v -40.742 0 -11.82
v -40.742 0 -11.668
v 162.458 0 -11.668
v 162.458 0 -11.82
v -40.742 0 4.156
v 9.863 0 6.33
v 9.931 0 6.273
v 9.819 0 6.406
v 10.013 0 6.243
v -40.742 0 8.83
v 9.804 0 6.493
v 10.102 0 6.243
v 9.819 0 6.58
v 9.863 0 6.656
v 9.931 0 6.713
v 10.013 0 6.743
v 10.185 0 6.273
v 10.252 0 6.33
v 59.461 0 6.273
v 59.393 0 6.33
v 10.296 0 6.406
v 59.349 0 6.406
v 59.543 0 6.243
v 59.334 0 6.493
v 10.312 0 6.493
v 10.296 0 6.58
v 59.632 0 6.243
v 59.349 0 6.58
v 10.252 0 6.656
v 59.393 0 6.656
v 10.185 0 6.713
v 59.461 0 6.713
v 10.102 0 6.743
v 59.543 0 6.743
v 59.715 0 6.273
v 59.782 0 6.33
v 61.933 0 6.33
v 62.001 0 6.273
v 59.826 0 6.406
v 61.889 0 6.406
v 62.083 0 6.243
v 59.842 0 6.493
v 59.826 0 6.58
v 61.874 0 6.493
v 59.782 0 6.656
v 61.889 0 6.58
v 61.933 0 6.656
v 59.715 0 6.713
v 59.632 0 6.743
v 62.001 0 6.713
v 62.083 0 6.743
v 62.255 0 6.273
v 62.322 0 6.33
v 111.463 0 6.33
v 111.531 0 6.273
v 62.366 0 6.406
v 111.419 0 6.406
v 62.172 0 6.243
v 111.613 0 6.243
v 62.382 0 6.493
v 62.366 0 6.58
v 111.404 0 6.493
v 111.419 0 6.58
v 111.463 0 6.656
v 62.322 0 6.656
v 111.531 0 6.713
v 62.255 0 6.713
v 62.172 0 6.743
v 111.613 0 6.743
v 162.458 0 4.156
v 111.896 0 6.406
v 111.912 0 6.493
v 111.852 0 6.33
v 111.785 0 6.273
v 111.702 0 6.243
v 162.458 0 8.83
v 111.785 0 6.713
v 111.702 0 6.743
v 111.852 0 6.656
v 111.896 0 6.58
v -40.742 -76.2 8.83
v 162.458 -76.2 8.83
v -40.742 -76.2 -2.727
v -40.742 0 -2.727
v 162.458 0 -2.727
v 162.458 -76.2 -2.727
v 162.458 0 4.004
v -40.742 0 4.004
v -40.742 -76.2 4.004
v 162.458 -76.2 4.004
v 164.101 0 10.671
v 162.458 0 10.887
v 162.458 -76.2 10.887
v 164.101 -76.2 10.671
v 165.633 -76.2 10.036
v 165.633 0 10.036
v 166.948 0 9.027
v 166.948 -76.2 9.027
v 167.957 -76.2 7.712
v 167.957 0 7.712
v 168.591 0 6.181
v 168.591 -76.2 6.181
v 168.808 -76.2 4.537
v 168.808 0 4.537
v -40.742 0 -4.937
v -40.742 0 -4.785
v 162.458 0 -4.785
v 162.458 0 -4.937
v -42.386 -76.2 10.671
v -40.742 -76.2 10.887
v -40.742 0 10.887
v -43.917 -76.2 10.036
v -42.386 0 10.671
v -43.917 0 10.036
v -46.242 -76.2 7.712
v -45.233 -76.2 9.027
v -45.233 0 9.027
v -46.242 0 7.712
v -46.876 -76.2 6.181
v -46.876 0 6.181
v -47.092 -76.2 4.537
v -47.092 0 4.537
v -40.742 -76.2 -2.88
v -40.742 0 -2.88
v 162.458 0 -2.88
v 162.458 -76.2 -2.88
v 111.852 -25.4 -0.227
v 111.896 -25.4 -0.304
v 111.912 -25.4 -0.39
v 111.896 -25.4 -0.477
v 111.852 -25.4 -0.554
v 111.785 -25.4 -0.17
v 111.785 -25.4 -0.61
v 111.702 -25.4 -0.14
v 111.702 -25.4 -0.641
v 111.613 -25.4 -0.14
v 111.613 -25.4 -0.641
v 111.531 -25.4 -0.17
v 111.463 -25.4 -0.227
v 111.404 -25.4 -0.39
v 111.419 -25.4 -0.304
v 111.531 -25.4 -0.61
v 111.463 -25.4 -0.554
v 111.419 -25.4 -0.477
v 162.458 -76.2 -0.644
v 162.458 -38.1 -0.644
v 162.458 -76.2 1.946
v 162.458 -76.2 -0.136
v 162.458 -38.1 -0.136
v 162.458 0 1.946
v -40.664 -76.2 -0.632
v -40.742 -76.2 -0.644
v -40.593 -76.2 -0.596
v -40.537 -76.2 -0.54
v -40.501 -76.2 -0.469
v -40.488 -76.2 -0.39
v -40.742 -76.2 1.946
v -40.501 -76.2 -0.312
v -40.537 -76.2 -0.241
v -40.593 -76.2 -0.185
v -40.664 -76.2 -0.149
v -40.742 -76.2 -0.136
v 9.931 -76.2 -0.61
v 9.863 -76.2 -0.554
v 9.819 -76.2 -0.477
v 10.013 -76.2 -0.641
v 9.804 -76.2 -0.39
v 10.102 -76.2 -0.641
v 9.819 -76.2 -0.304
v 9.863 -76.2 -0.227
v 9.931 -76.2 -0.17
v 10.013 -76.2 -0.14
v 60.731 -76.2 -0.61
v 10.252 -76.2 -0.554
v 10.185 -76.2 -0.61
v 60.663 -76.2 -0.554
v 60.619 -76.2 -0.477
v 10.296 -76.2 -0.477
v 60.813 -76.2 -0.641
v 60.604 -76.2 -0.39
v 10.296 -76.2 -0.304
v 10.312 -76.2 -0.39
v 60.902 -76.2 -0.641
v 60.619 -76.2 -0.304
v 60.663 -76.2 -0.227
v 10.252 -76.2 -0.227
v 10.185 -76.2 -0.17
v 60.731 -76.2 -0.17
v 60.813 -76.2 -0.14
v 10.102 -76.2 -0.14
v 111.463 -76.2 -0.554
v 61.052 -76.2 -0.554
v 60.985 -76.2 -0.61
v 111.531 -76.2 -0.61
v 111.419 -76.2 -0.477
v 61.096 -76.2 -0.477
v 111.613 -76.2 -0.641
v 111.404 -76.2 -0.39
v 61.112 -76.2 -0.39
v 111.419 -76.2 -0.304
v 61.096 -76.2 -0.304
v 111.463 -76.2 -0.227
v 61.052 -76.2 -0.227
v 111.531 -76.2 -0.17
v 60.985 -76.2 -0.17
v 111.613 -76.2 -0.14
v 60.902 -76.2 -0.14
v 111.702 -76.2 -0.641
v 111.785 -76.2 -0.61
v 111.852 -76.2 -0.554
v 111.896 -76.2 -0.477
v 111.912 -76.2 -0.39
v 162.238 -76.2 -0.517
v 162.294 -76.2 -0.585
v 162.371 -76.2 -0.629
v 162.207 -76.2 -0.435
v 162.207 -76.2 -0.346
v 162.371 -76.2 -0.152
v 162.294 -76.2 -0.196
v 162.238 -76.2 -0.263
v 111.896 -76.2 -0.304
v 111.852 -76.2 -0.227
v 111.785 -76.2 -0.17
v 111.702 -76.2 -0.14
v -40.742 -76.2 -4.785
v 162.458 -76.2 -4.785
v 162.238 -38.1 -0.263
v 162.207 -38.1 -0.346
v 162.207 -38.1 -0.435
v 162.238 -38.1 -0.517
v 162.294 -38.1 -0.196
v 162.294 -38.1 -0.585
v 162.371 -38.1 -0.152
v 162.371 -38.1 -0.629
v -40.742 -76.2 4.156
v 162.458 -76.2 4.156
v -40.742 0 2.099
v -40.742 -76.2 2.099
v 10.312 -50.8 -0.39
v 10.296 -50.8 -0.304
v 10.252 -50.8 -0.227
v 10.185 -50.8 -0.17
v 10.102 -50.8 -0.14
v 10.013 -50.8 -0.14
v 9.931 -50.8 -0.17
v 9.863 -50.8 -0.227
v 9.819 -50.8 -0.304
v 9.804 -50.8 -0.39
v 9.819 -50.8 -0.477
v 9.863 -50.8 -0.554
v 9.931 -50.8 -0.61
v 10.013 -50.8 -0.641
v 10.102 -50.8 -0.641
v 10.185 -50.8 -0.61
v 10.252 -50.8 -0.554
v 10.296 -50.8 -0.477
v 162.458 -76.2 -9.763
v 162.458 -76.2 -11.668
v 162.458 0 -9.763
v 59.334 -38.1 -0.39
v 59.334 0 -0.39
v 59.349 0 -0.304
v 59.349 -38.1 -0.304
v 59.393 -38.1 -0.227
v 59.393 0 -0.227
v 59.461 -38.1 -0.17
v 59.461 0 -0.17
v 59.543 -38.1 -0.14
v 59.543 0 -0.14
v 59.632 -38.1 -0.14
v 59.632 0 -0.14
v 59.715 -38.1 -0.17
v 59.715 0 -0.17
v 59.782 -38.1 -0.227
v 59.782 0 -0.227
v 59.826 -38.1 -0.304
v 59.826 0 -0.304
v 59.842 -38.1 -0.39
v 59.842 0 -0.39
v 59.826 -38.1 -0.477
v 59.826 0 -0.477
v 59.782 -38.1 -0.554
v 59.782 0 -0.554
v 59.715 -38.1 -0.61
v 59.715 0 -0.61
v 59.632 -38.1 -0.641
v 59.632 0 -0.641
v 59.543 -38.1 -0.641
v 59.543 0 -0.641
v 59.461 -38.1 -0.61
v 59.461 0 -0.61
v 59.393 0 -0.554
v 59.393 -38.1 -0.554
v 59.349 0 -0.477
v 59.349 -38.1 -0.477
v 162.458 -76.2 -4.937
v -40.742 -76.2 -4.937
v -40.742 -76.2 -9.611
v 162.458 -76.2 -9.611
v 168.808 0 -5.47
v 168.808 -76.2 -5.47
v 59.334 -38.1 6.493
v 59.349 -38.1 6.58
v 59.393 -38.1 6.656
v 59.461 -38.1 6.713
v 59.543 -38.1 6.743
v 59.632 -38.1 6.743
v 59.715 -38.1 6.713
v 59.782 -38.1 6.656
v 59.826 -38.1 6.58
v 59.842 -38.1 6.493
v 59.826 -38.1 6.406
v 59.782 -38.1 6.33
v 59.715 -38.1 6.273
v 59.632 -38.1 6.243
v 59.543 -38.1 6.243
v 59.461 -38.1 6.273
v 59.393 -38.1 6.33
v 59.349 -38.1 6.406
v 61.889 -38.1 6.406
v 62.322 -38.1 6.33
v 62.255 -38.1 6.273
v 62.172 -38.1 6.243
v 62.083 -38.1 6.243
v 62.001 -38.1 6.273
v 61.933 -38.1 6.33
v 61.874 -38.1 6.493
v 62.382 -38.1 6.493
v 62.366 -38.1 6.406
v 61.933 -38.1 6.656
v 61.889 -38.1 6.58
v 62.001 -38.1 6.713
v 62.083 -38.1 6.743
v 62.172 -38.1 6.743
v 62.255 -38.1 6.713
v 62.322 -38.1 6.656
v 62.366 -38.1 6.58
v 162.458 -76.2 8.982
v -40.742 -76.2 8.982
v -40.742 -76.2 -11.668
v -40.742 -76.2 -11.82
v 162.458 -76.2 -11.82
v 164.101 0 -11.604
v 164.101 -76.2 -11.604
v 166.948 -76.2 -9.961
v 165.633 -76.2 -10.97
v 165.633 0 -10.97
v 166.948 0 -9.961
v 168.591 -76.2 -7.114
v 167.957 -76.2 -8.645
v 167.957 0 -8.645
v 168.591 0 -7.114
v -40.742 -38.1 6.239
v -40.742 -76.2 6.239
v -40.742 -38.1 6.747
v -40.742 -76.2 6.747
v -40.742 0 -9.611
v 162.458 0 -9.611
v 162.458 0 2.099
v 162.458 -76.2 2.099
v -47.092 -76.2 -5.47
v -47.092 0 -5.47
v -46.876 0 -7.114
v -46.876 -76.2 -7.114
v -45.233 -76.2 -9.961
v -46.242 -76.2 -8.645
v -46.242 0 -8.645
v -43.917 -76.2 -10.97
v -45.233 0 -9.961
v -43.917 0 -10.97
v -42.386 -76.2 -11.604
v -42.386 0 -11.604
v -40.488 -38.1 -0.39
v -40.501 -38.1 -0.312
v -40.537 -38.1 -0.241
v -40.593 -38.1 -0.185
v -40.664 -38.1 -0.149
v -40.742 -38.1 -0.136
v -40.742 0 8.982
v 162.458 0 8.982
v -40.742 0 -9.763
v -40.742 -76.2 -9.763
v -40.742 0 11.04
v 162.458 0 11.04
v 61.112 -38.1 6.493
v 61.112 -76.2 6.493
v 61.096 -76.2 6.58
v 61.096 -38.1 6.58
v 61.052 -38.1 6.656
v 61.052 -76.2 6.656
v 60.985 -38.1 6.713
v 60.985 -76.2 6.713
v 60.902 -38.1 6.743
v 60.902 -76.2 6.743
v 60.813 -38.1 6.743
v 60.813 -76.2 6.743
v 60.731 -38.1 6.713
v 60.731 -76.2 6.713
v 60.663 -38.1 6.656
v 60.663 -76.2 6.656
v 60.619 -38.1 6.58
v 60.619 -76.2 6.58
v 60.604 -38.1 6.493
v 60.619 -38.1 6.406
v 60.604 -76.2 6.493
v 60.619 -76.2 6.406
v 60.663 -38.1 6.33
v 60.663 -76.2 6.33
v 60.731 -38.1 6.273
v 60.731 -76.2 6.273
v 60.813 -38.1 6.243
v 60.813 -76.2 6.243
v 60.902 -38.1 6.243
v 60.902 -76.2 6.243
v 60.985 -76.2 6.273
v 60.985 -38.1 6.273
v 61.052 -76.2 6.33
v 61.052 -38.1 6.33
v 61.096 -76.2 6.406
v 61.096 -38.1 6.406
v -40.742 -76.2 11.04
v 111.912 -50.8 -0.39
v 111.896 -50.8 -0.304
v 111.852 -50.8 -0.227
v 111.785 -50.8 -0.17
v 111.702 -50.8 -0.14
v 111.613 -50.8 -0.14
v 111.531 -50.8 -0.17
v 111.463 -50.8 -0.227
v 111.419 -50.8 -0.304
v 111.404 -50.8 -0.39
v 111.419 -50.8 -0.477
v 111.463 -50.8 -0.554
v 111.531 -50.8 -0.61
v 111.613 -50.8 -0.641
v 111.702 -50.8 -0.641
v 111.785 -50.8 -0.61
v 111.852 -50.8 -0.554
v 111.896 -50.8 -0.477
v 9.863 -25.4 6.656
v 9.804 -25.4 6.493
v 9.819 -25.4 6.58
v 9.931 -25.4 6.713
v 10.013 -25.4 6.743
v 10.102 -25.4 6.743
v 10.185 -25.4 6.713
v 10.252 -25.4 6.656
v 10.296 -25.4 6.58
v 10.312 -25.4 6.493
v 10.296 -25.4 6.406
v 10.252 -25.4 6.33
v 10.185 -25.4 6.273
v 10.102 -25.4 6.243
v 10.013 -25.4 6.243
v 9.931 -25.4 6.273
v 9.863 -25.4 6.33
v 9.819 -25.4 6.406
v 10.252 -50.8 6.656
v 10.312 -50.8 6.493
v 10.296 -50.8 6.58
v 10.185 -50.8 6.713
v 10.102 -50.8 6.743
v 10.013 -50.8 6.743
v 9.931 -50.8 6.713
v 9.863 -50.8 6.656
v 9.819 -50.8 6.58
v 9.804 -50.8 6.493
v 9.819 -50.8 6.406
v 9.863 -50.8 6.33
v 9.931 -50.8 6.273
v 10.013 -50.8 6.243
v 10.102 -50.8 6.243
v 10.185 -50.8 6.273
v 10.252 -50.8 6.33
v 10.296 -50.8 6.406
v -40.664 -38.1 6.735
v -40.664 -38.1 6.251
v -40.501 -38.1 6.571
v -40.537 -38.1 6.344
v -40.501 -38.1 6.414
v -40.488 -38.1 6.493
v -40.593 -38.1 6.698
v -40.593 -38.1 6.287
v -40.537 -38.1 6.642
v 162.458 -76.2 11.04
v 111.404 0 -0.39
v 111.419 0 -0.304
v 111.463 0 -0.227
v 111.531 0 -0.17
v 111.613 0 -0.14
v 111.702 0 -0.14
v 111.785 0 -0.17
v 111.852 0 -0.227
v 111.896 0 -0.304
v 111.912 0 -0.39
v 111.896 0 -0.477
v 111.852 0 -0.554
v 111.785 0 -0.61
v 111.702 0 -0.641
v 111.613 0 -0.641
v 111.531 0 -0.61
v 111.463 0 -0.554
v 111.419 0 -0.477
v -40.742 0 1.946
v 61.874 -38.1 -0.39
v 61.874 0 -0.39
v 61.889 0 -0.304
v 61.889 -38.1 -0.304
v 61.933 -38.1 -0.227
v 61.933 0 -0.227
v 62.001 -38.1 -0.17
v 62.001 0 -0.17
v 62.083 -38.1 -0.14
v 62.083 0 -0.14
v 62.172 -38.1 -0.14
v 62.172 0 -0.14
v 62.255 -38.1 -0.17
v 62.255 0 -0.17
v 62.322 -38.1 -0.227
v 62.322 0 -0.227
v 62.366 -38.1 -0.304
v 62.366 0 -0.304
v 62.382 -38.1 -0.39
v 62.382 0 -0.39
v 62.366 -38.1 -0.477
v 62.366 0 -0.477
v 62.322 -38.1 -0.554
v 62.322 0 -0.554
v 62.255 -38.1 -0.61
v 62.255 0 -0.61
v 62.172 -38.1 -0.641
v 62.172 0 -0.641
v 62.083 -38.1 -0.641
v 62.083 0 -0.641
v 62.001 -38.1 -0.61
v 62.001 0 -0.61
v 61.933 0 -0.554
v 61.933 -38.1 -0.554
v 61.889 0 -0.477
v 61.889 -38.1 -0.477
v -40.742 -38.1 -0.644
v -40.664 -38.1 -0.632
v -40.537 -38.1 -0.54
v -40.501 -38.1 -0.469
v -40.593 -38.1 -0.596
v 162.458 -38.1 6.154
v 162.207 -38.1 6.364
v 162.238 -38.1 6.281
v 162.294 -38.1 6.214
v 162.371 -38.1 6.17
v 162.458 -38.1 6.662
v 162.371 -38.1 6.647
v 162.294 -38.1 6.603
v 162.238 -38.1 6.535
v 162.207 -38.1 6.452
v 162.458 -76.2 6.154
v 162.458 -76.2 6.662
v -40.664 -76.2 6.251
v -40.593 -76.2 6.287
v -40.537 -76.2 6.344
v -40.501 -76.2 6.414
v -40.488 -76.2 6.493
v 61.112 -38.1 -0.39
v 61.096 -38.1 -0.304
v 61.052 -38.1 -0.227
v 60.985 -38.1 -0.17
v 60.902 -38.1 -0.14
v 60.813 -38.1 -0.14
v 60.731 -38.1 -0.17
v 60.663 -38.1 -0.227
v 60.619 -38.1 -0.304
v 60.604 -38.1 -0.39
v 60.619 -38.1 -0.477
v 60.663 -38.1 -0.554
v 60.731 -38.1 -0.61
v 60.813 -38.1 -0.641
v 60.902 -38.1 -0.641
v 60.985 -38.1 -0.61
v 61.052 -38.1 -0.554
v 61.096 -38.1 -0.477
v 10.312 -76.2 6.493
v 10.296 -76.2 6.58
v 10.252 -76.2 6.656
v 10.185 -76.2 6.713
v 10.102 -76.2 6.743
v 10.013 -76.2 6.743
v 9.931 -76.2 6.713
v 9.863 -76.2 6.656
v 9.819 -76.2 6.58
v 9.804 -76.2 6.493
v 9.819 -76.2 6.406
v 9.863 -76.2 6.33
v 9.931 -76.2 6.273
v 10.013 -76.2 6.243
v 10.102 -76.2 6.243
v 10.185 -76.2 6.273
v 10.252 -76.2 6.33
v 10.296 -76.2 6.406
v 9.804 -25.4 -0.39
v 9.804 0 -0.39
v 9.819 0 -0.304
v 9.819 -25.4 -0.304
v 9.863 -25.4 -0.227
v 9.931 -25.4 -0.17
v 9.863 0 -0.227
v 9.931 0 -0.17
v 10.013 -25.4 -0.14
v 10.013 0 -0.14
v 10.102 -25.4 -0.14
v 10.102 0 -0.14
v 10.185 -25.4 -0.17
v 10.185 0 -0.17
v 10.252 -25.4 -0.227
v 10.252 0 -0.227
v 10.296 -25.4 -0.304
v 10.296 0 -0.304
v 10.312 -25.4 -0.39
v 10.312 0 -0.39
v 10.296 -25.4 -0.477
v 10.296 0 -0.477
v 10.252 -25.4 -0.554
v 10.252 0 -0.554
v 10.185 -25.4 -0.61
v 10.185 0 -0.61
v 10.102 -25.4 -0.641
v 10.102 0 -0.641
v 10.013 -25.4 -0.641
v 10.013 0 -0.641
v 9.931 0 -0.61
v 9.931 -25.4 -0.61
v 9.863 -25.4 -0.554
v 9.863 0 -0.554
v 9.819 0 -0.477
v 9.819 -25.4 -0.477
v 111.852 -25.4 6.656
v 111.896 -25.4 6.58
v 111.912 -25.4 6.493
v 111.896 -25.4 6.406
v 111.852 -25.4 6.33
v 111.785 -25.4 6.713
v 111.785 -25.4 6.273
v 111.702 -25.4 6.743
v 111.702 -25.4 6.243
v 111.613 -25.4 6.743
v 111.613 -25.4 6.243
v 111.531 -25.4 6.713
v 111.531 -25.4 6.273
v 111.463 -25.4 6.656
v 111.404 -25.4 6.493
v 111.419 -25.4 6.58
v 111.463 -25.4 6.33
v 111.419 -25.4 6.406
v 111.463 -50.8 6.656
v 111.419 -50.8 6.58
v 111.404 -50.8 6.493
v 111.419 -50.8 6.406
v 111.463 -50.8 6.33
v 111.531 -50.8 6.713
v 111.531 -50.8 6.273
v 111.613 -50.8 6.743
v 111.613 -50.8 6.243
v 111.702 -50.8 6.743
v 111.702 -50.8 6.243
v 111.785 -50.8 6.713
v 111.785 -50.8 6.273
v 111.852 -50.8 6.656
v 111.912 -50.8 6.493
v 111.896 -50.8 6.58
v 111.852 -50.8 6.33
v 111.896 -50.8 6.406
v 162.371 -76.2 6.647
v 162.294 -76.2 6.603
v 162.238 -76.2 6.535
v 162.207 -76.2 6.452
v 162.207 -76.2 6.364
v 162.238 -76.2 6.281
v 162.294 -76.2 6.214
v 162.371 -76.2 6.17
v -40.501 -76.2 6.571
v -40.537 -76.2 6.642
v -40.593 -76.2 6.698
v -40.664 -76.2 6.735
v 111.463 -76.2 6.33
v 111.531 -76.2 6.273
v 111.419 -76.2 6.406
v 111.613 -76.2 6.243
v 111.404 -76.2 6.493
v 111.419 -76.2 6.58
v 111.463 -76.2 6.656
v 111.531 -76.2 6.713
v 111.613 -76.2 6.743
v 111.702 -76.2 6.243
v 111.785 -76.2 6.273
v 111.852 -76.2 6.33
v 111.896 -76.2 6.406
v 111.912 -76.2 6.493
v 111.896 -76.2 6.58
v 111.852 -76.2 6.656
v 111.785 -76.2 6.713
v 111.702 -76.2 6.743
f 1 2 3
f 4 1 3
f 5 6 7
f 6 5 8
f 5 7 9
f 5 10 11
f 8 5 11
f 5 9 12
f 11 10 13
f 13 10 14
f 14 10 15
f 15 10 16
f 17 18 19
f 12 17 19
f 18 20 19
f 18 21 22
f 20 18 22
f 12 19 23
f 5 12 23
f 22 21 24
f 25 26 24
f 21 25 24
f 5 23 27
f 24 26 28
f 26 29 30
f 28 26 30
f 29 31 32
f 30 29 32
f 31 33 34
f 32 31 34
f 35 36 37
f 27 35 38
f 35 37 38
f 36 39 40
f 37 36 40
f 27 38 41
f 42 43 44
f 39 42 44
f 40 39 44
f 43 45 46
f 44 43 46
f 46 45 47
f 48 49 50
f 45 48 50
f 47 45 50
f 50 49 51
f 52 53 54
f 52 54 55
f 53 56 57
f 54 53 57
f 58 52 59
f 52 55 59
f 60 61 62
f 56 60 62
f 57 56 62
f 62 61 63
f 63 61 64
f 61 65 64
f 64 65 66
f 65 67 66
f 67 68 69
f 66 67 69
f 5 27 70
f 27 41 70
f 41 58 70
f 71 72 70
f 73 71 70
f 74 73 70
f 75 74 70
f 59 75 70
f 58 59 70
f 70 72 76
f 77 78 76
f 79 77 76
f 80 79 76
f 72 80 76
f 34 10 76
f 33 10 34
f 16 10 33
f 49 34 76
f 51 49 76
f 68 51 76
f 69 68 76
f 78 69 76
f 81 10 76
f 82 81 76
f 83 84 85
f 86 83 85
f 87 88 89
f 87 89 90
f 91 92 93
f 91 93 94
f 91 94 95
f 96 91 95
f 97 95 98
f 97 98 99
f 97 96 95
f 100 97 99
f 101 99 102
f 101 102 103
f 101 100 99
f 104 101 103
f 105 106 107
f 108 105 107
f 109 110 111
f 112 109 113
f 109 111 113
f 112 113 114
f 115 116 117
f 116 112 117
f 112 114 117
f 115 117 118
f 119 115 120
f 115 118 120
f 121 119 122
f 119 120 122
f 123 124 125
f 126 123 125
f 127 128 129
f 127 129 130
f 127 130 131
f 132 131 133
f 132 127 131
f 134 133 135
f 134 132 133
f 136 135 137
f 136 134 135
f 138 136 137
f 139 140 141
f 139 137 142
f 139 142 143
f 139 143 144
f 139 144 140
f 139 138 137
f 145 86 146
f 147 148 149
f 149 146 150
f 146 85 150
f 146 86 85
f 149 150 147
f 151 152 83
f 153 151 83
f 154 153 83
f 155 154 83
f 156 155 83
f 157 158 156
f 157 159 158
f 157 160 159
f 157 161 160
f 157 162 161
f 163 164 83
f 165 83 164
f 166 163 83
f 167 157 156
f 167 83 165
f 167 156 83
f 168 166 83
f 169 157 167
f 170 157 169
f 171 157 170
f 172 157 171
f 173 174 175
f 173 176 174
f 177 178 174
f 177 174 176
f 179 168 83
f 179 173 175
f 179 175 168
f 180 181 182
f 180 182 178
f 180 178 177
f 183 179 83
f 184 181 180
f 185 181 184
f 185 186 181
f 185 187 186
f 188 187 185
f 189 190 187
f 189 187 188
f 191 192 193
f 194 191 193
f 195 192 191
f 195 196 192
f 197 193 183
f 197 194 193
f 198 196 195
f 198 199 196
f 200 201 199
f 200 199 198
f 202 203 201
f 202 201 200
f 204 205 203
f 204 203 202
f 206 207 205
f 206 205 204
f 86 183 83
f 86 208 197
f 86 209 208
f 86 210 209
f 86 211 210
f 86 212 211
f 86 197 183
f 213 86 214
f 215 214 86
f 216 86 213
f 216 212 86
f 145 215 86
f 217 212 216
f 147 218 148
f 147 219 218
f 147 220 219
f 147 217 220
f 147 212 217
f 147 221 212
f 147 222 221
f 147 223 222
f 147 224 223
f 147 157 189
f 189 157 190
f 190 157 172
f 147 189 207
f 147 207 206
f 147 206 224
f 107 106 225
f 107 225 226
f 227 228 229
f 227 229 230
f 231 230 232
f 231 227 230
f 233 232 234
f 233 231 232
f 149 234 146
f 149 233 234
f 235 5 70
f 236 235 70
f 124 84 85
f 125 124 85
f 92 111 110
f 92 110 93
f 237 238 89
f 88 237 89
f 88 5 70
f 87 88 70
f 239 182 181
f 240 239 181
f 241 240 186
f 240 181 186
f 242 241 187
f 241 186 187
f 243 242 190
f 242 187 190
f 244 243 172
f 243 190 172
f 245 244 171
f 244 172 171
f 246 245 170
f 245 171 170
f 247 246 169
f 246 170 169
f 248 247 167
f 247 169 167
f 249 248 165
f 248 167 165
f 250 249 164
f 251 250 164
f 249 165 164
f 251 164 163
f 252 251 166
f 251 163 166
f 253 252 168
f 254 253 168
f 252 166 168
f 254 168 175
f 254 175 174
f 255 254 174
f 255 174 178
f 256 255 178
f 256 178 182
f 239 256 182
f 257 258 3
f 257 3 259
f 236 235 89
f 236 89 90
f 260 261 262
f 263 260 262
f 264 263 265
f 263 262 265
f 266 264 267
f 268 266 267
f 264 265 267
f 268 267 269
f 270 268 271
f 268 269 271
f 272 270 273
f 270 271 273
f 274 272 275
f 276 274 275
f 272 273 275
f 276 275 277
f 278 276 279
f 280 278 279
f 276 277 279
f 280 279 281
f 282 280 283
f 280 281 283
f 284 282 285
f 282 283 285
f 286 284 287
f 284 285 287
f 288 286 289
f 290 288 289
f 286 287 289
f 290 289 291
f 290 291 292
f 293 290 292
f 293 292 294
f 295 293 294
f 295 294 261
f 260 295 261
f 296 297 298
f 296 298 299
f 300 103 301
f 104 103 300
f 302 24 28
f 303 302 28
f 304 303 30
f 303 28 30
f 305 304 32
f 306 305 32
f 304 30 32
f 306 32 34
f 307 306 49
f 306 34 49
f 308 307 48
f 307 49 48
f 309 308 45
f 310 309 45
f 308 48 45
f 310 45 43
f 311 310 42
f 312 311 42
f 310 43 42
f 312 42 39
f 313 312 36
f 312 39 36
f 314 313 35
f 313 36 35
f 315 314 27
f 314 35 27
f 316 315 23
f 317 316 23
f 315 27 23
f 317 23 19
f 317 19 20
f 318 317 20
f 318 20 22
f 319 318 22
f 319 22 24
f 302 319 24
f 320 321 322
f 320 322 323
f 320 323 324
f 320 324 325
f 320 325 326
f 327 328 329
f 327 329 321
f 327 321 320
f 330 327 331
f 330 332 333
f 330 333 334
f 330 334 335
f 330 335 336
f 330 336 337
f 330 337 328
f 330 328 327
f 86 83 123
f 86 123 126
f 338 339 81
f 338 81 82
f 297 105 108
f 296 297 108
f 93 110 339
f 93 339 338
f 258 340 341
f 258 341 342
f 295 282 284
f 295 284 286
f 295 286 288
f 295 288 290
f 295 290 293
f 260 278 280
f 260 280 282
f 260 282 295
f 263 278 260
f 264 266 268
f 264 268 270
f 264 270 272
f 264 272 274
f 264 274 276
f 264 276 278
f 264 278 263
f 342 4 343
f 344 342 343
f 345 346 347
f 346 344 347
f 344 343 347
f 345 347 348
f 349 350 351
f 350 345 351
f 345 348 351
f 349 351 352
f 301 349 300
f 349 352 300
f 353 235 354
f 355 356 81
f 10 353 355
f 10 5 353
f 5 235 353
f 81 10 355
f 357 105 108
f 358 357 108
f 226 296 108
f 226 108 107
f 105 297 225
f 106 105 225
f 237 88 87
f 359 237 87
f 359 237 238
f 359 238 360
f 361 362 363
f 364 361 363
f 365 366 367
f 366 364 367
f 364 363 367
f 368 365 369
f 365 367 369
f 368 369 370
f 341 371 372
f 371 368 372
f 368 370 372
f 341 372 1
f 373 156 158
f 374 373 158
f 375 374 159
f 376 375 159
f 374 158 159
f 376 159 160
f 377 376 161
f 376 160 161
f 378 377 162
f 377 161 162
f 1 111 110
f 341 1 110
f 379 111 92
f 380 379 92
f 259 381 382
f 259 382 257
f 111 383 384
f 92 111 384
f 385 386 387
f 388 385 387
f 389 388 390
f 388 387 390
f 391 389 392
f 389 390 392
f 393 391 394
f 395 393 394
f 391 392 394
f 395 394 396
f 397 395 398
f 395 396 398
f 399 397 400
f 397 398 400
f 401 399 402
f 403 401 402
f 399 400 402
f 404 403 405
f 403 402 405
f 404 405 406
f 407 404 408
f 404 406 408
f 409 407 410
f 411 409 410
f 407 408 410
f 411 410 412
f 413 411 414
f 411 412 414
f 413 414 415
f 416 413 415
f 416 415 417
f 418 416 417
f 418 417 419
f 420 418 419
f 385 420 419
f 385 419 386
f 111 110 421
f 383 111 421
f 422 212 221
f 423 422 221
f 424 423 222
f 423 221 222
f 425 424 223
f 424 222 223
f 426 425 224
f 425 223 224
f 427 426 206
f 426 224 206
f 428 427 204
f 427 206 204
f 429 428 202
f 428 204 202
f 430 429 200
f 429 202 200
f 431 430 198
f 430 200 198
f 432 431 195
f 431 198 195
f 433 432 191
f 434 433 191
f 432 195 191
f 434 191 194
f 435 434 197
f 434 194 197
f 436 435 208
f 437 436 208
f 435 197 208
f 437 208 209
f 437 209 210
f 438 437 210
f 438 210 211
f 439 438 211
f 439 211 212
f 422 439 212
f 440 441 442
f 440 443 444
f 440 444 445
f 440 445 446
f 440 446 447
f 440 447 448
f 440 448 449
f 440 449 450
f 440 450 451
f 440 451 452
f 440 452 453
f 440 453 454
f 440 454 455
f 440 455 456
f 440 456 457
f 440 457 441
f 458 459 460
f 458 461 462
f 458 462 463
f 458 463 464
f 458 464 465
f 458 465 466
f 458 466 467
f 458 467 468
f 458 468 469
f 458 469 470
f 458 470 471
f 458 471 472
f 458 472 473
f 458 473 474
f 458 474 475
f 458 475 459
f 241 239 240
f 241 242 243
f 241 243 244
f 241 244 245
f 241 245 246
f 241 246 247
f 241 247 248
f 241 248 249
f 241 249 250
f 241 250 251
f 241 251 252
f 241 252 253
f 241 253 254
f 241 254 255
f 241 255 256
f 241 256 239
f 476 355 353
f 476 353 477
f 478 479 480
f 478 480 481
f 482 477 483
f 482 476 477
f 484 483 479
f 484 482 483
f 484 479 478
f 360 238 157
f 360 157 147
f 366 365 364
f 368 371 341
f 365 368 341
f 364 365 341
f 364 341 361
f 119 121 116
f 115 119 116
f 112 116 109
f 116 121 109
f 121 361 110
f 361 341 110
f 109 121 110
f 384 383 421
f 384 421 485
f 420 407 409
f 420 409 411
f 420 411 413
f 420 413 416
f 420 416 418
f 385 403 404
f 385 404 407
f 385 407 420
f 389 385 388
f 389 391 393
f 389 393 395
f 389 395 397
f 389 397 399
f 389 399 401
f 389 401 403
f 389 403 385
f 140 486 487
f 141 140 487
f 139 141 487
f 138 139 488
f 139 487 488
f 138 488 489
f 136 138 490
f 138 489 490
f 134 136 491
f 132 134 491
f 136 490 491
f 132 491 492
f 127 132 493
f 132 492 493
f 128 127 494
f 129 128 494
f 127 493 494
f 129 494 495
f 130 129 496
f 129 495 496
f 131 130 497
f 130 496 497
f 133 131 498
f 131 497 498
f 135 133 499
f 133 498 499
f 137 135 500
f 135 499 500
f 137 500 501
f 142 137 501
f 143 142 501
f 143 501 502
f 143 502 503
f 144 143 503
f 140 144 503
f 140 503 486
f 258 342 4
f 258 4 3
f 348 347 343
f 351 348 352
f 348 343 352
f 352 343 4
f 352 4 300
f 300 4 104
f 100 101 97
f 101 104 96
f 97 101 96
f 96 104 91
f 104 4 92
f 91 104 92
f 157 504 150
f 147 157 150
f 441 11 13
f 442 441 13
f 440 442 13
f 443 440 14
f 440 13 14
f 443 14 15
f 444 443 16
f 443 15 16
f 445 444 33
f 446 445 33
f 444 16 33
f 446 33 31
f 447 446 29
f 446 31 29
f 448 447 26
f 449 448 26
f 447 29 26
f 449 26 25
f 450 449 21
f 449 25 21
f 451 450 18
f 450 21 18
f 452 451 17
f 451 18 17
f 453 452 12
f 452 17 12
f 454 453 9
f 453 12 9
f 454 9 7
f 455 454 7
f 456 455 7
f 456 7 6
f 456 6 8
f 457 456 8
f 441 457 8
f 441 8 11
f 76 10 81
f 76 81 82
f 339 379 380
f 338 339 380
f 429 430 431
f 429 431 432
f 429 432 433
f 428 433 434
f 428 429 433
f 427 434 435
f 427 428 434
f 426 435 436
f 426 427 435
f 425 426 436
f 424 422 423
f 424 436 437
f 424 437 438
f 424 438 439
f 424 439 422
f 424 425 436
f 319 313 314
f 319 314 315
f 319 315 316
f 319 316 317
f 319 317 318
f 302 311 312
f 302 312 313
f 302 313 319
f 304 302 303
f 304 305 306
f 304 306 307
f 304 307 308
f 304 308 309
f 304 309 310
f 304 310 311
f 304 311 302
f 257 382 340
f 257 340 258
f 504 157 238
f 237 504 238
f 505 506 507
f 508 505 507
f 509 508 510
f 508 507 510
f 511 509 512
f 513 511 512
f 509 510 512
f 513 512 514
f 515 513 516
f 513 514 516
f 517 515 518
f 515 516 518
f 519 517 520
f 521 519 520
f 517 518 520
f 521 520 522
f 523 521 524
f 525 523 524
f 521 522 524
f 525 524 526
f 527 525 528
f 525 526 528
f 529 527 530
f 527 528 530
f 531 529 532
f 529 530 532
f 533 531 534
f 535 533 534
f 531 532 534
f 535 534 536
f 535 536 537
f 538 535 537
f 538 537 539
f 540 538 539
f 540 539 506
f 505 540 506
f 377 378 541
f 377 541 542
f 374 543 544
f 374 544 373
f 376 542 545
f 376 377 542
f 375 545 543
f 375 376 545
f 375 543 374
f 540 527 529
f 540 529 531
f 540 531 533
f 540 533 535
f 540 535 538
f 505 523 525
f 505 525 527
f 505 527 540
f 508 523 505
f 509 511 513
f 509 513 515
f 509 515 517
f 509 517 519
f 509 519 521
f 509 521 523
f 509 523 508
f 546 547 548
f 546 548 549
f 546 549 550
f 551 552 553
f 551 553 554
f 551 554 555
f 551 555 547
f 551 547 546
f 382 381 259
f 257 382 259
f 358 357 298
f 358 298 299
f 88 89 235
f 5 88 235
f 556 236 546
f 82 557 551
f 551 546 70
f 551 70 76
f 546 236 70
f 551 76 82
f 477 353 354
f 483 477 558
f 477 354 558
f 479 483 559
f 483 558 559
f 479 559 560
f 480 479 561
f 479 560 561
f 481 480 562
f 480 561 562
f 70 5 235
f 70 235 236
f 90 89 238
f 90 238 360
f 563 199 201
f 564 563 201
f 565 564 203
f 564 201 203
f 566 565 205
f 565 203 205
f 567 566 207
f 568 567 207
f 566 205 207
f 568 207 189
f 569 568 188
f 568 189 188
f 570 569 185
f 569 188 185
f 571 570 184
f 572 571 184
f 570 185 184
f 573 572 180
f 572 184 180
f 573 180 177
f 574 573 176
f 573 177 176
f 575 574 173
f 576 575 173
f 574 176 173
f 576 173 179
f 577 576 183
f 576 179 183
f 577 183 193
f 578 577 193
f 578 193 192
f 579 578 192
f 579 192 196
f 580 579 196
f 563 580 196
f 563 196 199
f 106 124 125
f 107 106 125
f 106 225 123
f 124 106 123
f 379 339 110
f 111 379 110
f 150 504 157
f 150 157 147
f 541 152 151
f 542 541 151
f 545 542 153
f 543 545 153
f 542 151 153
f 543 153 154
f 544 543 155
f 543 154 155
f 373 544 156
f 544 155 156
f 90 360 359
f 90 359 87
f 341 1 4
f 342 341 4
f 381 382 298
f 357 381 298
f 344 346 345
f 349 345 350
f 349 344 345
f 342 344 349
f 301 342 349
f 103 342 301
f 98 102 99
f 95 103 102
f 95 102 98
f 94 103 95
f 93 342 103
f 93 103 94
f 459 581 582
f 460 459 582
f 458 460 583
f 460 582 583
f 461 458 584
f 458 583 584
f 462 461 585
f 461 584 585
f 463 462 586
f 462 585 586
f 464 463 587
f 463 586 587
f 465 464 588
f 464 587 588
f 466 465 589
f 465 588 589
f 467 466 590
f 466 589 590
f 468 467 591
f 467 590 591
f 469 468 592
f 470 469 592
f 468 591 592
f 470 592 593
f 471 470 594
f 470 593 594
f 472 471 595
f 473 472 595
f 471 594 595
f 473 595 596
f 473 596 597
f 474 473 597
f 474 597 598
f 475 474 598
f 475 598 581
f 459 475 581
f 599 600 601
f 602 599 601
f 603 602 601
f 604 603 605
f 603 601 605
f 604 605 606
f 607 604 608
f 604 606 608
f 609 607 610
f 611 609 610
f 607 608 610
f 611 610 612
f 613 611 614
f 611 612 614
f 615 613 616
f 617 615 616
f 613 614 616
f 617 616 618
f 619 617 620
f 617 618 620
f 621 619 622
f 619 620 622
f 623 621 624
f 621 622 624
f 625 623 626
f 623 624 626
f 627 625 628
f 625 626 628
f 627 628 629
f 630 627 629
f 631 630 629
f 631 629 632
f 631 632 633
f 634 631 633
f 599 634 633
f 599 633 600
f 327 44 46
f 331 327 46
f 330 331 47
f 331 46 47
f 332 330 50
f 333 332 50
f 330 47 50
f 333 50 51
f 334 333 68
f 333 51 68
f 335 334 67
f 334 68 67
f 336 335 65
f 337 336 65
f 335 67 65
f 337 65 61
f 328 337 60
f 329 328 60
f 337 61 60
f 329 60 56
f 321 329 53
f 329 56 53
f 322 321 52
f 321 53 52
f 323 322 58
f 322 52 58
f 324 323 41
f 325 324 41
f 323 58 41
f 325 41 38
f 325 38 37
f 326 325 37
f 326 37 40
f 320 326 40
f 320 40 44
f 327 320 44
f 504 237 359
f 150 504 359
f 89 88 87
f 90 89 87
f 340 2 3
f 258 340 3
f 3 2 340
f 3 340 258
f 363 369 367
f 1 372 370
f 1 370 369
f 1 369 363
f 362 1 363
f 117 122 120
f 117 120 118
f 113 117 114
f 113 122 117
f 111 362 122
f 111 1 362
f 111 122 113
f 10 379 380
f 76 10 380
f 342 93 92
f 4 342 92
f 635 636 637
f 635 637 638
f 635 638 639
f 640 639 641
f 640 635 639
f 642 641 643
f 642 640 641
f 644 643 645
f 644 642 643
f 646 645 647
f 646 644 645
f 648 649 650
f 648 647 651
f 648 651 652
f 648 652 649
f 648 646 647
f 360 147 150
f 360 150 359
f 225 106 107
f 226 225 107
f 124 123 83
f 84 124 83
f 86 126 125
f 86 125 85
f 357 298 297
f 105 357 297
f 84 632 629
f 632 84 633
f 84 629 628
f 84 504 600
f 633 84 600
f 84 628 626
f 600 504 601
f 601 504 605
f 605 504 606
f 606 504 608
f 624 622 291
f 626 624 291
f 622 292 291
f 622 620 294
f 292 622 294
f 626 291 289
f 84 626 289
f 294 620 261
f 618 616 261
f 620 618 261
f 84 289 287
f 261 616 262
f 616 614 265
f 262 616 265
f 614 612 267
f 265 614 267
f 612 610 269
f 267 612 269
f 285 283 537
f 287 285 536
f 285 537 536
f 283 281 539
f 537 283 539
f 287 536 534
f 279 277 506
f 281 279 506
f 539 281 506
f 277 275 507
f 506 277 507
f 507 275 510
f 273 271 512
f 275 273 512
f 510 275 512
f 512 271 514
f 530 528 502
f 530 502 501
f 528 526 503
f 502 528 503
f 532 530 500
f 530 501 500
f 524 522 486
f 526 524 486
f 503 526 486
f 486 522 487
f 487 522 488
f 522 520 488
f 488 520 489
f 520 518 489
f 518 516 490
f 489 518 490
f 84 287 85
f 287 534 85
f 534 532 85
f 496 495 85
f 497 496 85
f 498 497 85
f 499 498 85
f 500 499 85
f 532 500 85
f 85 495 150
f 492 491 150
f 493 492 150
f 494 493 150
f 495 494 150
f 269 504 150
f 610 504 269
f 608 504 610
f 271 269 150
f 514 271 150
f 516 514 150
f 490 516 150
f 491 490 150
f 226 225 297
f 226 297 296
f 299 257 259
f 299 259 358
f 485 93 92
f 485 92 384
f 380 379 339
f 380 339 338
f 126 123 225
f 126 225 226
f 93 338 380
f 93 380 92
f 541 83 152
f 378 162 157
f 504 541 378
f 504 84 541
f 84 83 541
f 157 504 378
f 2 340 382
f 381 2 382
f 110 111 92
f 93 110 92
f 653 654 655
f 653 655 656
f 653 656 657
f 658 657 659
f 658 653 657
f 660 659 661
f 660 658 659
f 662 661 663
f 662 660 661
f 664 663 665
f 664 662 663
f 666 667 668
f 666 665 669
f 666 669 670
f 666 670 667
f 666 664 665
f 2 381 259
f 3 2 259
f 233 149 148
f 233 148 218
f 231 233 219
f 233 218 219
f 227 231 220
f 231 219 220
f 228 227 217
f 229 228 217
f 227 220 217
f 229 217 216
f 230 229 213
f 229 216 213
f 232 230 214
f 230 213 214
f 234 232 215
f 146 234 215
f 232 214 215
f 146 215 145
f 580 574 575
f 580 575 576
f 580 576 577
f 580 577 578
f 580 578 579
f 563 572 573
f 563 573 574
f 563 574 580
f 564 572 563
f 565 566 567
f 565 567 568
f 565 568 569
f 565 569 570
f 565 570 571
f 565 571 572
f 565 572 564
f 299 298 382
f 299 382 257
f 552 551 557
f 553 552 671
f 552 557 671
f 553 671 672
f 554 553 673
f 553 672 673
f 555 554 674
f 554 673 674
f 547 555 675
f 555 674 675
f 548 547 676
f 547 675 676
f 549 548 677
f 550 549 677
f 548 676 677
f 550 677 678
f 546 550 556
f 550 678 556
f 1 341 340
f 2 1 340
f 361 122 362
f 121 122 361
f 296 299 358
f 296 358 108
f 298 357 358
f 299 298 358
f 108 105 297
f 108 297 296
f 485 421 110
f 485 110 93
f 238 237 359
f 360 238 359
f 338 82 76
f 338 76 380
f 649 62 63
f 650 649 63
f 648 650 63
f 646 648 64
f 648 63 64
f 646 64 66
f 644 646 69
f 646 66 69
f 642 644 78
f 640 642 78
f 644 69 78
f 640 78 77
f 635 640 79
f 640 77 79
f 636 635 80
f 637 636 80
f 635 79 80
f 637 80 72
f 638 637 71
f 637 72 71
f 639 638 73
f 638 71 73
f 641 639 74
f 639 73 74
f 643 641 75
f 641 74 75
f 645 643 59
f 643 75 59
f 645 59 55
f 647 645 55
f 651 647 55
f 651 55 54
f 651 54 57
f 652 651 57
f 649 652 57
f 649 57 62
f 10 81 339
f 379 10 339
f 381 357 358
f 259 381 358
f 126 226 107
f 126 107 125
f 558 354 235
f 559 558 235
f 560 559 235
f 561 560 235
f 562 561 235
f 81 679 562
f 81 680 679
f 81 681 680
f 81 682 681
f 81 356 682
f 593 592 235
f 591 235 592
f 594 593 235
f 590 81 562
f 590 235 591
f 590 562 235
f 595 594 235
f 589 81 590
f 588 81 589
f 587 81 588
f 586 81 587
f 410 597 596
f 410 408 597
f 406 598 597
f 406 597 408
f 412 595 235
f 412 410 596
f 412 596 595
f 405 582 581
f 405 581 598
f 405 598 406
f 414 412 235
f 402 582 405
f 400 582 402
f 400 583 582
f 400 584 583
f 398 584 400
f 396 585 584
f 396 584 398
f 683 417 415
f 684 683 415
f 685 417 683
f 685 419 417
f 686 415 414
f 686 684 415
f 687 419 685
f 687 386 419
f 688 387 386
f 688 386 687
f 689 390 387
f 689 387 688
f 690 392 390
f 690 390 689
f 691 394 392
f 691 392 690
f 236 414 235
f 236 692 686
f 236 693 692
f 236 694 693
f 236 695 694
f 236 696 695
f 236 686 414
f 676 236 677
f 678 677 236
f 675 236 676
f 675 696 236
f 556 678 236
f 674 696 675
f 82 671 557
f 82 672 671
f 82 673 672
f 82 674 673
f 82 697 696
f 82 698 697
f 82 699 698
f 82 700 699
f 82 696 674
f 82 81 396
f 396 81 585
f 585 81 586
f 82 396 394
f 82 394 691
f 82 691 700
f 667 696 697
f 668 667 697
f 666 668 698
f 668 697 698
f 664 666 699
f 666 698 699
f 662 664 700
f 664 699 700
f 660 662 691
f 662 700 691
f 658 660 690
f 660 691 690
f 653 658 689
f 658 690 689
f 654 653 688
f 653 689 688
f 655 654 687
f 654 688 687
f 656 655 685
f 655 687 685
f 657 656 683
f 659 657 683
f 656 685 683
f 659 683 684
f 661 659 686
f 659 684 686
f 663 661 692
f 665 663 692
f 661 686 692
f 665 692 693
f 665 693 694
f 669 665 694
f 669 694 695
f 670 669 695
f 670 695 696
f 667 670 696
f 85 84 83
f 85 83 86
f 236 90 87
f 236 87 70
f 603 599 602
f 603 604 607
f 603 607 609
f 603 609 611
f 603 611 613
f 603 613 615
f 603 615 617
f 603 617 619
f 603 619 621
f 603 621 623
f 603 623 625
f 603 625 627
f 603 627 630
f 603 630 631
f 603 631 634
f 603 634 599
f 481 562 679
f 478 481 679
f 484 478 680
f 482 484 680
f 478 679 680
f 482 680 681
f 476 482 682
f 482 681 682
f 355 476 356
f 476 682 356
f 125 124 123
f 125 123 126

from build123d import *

# Parameters (mm, degrees)
F0_W           = 203.2
F0_H           = 0.1524
F1_DEPTH       = 76.2
F0_H_2         = 1.905
F2_DEPTH       = 76.2
F0_H_3         = 4.6736
F3_DEPTH       = 76.2
F4_W           = 76.2
F4_H           = 22.7076
F5_DEPTH       = 6.35
F6_W           = 76.2
F6_H           = 22.7076
F7_DEPTH       = 6.35
F8_R           = 0.254
F9_DEPTH       = 38.1
F10_R          = 0.254
F11_DEPTH      = 38.1
F12_T1_DEPTH   = 107.95
F12_T3_DEPTH   = 107.95
F12_2_T1_DEPTH = 107.95
F12_2_T3_DEPTH = 107.95
F13_DEPTH      = 25.4
F14_DEPTH      = 25.4
F15_R          = 0.254
F16_R          = 0.254
F17_DEPTH      = 25.4
F18_DEPTH      = 38.1


# Not quite as in the source:
# - a fillet or chamfer that OpenCascade refuses, or shapes differently, is made with other operations: its cross-section is extruded or revolved along the edge and cut away or added


with BuildPart() as f1:
    # F0 (on Front) → F1 (new body)
    with BuildSketch(Plane.XZ):
        with Locations((60.8575803399, -11.7442150349)):
            Rectangle(F0_W, F0_H)
    extrude(amount=F1_DEPTH)


with BuildPart() as f1b:
    # F0 (on Front) → F1, piece 2 (new body)
    with BuildSketch(Plane.XZ):
        with Locations((60.8575803399, -9.6868150349)):
            Rectangle(F0_W, F0_H)
    extrude(amount=F1_DEPTH)


with BuildPart() as f1c:
    # F0 (on Front) → F1, piece 3 (new body)
    with BuildSketch(Plane.XZ):
        with Locations((60.8575803399, -4.8608150349)):
            Rectangle(F0_W, F0_H)
    extrude(amount=F1_DEPTH)


with BuildPart() as f1d:
    # F0 (on Front) → F1, piece 4 (new body)
    with BuildSketch(Plane.XZ):
        with Locations((60.8575803399, -2.8034150349)):
            Rectangle(F0_W, F0_H)
    extrude(amount=F1_DEPTH)


with BuildPart() as f1e:
    # F0 (on Front) → F1, piece 5 (new body)
    with BuildSketch(Plane.XZ):
        with Locations((60.8575803399, 2.0225849651)):
            Rectangle(F0_W, F0_H)
    extrude(amount=F1_DEPTH)


with BuildPart() as f1f:
    # F0 (on Front) → F1, piece 6 (new body)
    with BuildSketch(Plane.XZ):
        with Locations((60.8575803399, 4.0799849651)):
            Rectangle(F0_W, F0_H)
    extrude(amount=F1_DEPTH)


with BuildPart() as f1g:
    # F0 (on Front) → F1, piece 7 (new body)
    with BuildSketch(Plane.XZ):
        with Locations((60.8575803399, 8.9059849651)):
            Rectangle(F0_W, F0_H)
    extrude(amount=F1_DEPTH)


with BuildPart() as f1h:
    # F0 (on Front) → F1, piece 8 (new body)
    with BuildSketch(Plane.XZ):
        with Locations((60.8575803399, 10.9633849651)):
            Rectangle(F0_W, F0_H)
    extrude(amount=F1_DEPTH)


with BuildPart() as f2:
    # F0 (on Front) → F2 (new body)
    with BuildSketch(Plane.XZ):
        with Locations((60.8575803399, -10.7155150349)):
            Rectangle(F0_W, F0_H_2)
    extrude(amount=F2_DEPTH)


with BuildPart() as f2b:
    # F0 (on Front) → F2, piece 2 (new body)
    with BuildSketch(Plane.XZ):
        with Locations((60.8575803399, -3.8321150349)):
            Rectangle(F0_W, F0_H_2)
    extrude(amount=F2_DEPTH)


with BuildPart() as f2c:
    # F0 (on Front) → F2, piece 3 (new body)
    with BuildSketch(Plane.XZ):
        with Locations((60.8575803399, 3.0512849651)):
            Rectangle(F0_W, F0_H_2)
    extrude(amount=F2_DEPTH)


with BuildPart() as f2d:
    # F0 (on Front) → F2, piece 4 (new body)
    with BuildSketch(Plane.XZ):
        with Locations((60.8575803399, 9.9346849651)):
            Rectangle(F0_W, F0_H_2)
    extrude(amount=F2_DEPTH)


with BuildPart() as f3:
    # F0 (on Front) → F3 (new body)
    with BuildSketch(Plane.XZ):
        with Locations((60.8575803399, 6.4929849651)):
            Rectangle(F0_W, F0_H_3)
    extrude(amount=F3_DEPTH)

    # F10 (on face) → F11 (cut)
    with BuildSketch(Plane.XZ.offset(76.2)):
        with BuildLine():
            ThreePointArc((-40.7424196601, 6.2389849651), (-40.5628145377, 6.3133798427), (-40.4884196601, 6.4929849651))
            ThreePointArc((-40.4884196601, 6.4929849651), (-40.5628145377, 6.6725900875), (-40.7424196601, 6.7469849651))
            Line((-40.7424196601, 6.7469849651), (-40.7424196601, 6.2389849651))
        make_face()
        with BuildLine():
            Line((-40.7424196601, 6.2389849651), (-40.7424196601, 6.7469849651))
            ThreePointArc((-40.7424196601, 6.7469849651), (-40.9964196601, 6.4929849651), (-40.7424196601, 6.2389849651))
        make_face()
        with BuildLine():
            Line((162.4575803399, 6.1543183082), (162.4575803399, 6.6623182886))
            ThreePointArc((162.4575803399, 6.6623182886), (162.2035097843, 6.4083182984), (162.4575803399, 6.1543183082))
        make_face()
        with Locations((60.8575803399, 6.4929849651)):
            Circle(F10_R)
    extrude(amount=-F11_DEPTH, mode=Mode.SUBTRACT)

    # F10 (on face) → F14 (cut)
    with BuildSketch(Plane.XZ.offset(76.2)):
        with Locations((10.0575803399, 6.4929849651)):
            Circle(F10_R)
        with Locations((111.6575803399, 6.4929849651)):
            Circle(F10_R)
    extrude(amount=-F14_DEPTH, mode=Mode.SUBTRACT)


with BuildPart() as f3b:
    # F0 (on Front) → F3, piece 2 (new body)
    with BuildSketch(Plane.XZ):
        with Locations((60.8575803399, -0.3904150349)):
            Rectangle(F0_W, F0_H_3)
    extrude(amount=F3_DEPTH)

    # F8 (on face) → F9 (cut)
    with BuildSketch(Plane.XZ.offset(76.2)):
        with BuildLine():
            ThreePointArc((-40.7424196601, -0.6444150349), (-40.5628145377, -0.5700201573), (-40.4884196601, -0.3904150349))
            ThreePointArc((-40.4884196601, -0.3904150349), (-40.5628145377, -0.2108099125), (-40.7424196601, -0.1364150349))
            Line((-40.7424196601, -0.1364150349), (-40.7424196601, -0.6444150349))
        make_face()
        with BuildLine():
            Line((-40.7424196601, -0.6444150349), (-40.7424196601, -0.1364150349))
            ThreePointArc((-40.7424196601, -0.1364150349), (-40.9964196601, -0.3904150349), (-40.7424196601, -0.6444150349))
        make_face()
        with BuildLine():
            Line((162.4575803399, -0.6444150349), (162.4575803399, -0.1364150349))
            ThreePointArc((162.4575803399, -0.1364150349), (162.2035803399, -0.3904150349), (162.4575803399, -0.6444150349))
        make_face()
        with Locations((60.8575803399, -0.3904150349)):
            Circle(F8_R)
    extrude(amount=-F9_DEPTH, mode=Mode.SUBTRACT)

    # F8 (on face) → F13 (cut)
    with BuildSketch(Plane.XZ.offset(76.2)):
        with Locations((10.0575803399, -0.3904150349)):
            Circle(F8_R)
        with Locations((111.6575803399, -0.3904150349)):
            Circle(F8_R)
    extrude(amount=-F13_DEPTH, mode=Mode.SUBTRACT)


with BuildPart() as f3c:
    # F0 (on Front) → F3, piece 3 (new body)
    with BuildSketch(Plane.XZ):
        with Locations((60.8575803399, -7.2738150349)):
            Rectangle(F0_W, F0_H_3)
    extrude(amount=F3_DEPTH)


with BuildPart() as f5:
    # F4 (on face) → F5 (new body)
    with BuildSketch(Plane.YZ.offset(162.4575803399)):
        with Locations((-38.1, -0.4666150349)):
            Rectangle(F4_W, F4_H)
    extrude(amount=F5_DEPTH)

    # F12: fillet of radius 6.35 on 4 edges, made by hand

    # F12_s2 → F12_t1 (cut)
    with BuildSketch(Plane.XZ.offset(-15.875)):
        with BuildLine():
            ThreePointArc((162.4575803399, -11.8204150349), (166.9477084004, -9.9605430954), (168.8075803399, -5.4704150349))
            Line((168.8075803399, -5.4704150349), (168.8075803399, -11.8204150349))
            Line((168.8075803399, -11.8204150349), (162.4575803399, -11.8204150349))
        make_face()
    extrude(amount=F12_T1_DEPTH, mode=Mode.SUBTRACT)

    # F12_s4 → F12_t3 (cut)
    with BuildSketch(Plane.XZ.offset(-15.875)):
        with BuildLine():
            ThreePointArc((162.4575803399, 10.8871849651), (166.9477084004, 9.0273130256), (168.8075803399, 4.5371849651))
            Line((168.8075803399, 4.5371849651), (168.8075803399, 10.8871849651))
            Line((168.8075803399, 10.8871849651), (162.4575803399, 10.8871849651))
        make_face()
    extrude(amount=F12_T3_DEPTH, mode=Mode.SUBTRACT)


with BuildPart() as f7:
    # F6 (on face) → F7 (new body)
    with BuildSketch(Plane(origin=(-40.7424196601, 0, 0), x_dir=(0, -1, 0), z_dir=(-1, 0, 0))):
        with Locations((38.1, -0.4666150349)):
            Rectangle(F6_W, F6_H)
    extrude(amount=F7_DEPTH)

    # F12#2: fillet of radius 6.35 on 4 edges, made by hand

    # F12_2_s2 → F12_2_t1 (cut)
    with BuildSketch(Plane.XZ.offset(-15.875)):
        with BuildLine():
            ThreePointArc((-40.7424196601, 10.8871849651), (-45.2325477206, 9.0273130256), (-47.0924196601, 4.5371849651))
            Line((-47.0924196601, 4.5371849651), (-47.0924196601, 10.8871849651))
            Line((-47.0924196601, 10.8871849651), (-40.7424196601, 10.8871849651))
        make_face()
    extrude(amount=F12_2_T1_DEPTH, mode=Mode.SUBTRACT)

    # F12_2_s4 → F12_2_t3 (cut)
    with BuildSketch(Plane.XZ.offset(-15.875)):
        with BuildLine():
            ThreePointArc((-47.0924196601, -5.4704150349), (-45.2325477206, -9.9605430954), (-40.7424196601, -11.8204150349))
            Line((-40.7424196601, -11.8204150349), (-47.0924196601, -11.8204150349))
            Line((-47.0924196601, -11.8204150349), (-47.0924196601, -5.4704150349))
        make_face()
    extrude(amount=F12_2_T3_DEPTH, mode=Mode.SUBTRACT)


with BuildPart() as f17_tool:
    # F15 (on face) + F16 (on face) → F17 (new body)
    with BuildSketch(Plane(origin=(0, 0, 0), x_dir=(-1, 0, 0), z_dir=(0, 1, 0))):
        with Locations((-111.6575803399, 6.4929849651)):
            Circle(F15_R)
        with Locations((-10.0575803399, 6.4929849651)):
            Circle(F15_R)
    with BuildSketch(Plane(origin=(0, 0, 0), x_dir=(-1, 0, 0), z_dir=(0, 1, 0))):
        with Locations((-111.6575803399, -0.3904150349)):
            Circle(F16_R)
        with Locations((-10.0575803399, -0.3904150349)):
            Circle(F16_R)
    extrude(amount=-F17_DEPTH)


with BuildPart() as f3_1:
    add(f3.part)

    # F17: cut by f17_tool
    add(f17_tool.part, mode=Mode.SUBTRACT)


with BuildPart() as f3b_1:
    add(f3b.part)

    # F17: cut by f17_tool
    add(f17_tool.part, mode=Mode.SUBTRACT)


with BuildPart() as f18_tool:
    # F16 (on face) + F15 (on face) → F18 (new body)
    with BuildSketch(Plane(origin=(0, 0, 0), x_dir=(-1, 0, 0), z_dir=(0, 1, 0))):
        with Locations((-62.1275803399, -0.3904150349)):
            Circle(F16_R)
        with Locations((-59.5875803399, -0.3904150349)):
            Circle(F16_R)
    with BuildSketch(Plane(origin=(0, 0, 0), x_dir=(-1, 0, 0), z_dir=(0, 1, 0))):
        with Locations((-62.1275803399, 6.4929849651)):
            Circle(F15_R)
        with Locations((-59.5875803399, 6.4929849651)):
            Circle(F15_R)
    extrude(amount=-F18_DEPTH)


with BuildPart() as f3_2:
    add(f3_1.part)

    # F18: cut by f18_tool
    add(f18_tool.part, mode=Mode.SUBTRACT)


with BuildPart() as f3b_2:
    add(f3b_1.part)

    # F18: cut by f18_tool
    add(f18_tool.part, mode=Mode.SUBTRACT)


solid = Compound([f1.part, f1b.part, f1c.part, f1d.part, f1e.part, f1f.part, f1g.part, f1h.part, f2.part, f2b.part, f2c.part, f2d.part, f3c.part, f5.part, f7.part, f3_2.part, f3b_2.part])
